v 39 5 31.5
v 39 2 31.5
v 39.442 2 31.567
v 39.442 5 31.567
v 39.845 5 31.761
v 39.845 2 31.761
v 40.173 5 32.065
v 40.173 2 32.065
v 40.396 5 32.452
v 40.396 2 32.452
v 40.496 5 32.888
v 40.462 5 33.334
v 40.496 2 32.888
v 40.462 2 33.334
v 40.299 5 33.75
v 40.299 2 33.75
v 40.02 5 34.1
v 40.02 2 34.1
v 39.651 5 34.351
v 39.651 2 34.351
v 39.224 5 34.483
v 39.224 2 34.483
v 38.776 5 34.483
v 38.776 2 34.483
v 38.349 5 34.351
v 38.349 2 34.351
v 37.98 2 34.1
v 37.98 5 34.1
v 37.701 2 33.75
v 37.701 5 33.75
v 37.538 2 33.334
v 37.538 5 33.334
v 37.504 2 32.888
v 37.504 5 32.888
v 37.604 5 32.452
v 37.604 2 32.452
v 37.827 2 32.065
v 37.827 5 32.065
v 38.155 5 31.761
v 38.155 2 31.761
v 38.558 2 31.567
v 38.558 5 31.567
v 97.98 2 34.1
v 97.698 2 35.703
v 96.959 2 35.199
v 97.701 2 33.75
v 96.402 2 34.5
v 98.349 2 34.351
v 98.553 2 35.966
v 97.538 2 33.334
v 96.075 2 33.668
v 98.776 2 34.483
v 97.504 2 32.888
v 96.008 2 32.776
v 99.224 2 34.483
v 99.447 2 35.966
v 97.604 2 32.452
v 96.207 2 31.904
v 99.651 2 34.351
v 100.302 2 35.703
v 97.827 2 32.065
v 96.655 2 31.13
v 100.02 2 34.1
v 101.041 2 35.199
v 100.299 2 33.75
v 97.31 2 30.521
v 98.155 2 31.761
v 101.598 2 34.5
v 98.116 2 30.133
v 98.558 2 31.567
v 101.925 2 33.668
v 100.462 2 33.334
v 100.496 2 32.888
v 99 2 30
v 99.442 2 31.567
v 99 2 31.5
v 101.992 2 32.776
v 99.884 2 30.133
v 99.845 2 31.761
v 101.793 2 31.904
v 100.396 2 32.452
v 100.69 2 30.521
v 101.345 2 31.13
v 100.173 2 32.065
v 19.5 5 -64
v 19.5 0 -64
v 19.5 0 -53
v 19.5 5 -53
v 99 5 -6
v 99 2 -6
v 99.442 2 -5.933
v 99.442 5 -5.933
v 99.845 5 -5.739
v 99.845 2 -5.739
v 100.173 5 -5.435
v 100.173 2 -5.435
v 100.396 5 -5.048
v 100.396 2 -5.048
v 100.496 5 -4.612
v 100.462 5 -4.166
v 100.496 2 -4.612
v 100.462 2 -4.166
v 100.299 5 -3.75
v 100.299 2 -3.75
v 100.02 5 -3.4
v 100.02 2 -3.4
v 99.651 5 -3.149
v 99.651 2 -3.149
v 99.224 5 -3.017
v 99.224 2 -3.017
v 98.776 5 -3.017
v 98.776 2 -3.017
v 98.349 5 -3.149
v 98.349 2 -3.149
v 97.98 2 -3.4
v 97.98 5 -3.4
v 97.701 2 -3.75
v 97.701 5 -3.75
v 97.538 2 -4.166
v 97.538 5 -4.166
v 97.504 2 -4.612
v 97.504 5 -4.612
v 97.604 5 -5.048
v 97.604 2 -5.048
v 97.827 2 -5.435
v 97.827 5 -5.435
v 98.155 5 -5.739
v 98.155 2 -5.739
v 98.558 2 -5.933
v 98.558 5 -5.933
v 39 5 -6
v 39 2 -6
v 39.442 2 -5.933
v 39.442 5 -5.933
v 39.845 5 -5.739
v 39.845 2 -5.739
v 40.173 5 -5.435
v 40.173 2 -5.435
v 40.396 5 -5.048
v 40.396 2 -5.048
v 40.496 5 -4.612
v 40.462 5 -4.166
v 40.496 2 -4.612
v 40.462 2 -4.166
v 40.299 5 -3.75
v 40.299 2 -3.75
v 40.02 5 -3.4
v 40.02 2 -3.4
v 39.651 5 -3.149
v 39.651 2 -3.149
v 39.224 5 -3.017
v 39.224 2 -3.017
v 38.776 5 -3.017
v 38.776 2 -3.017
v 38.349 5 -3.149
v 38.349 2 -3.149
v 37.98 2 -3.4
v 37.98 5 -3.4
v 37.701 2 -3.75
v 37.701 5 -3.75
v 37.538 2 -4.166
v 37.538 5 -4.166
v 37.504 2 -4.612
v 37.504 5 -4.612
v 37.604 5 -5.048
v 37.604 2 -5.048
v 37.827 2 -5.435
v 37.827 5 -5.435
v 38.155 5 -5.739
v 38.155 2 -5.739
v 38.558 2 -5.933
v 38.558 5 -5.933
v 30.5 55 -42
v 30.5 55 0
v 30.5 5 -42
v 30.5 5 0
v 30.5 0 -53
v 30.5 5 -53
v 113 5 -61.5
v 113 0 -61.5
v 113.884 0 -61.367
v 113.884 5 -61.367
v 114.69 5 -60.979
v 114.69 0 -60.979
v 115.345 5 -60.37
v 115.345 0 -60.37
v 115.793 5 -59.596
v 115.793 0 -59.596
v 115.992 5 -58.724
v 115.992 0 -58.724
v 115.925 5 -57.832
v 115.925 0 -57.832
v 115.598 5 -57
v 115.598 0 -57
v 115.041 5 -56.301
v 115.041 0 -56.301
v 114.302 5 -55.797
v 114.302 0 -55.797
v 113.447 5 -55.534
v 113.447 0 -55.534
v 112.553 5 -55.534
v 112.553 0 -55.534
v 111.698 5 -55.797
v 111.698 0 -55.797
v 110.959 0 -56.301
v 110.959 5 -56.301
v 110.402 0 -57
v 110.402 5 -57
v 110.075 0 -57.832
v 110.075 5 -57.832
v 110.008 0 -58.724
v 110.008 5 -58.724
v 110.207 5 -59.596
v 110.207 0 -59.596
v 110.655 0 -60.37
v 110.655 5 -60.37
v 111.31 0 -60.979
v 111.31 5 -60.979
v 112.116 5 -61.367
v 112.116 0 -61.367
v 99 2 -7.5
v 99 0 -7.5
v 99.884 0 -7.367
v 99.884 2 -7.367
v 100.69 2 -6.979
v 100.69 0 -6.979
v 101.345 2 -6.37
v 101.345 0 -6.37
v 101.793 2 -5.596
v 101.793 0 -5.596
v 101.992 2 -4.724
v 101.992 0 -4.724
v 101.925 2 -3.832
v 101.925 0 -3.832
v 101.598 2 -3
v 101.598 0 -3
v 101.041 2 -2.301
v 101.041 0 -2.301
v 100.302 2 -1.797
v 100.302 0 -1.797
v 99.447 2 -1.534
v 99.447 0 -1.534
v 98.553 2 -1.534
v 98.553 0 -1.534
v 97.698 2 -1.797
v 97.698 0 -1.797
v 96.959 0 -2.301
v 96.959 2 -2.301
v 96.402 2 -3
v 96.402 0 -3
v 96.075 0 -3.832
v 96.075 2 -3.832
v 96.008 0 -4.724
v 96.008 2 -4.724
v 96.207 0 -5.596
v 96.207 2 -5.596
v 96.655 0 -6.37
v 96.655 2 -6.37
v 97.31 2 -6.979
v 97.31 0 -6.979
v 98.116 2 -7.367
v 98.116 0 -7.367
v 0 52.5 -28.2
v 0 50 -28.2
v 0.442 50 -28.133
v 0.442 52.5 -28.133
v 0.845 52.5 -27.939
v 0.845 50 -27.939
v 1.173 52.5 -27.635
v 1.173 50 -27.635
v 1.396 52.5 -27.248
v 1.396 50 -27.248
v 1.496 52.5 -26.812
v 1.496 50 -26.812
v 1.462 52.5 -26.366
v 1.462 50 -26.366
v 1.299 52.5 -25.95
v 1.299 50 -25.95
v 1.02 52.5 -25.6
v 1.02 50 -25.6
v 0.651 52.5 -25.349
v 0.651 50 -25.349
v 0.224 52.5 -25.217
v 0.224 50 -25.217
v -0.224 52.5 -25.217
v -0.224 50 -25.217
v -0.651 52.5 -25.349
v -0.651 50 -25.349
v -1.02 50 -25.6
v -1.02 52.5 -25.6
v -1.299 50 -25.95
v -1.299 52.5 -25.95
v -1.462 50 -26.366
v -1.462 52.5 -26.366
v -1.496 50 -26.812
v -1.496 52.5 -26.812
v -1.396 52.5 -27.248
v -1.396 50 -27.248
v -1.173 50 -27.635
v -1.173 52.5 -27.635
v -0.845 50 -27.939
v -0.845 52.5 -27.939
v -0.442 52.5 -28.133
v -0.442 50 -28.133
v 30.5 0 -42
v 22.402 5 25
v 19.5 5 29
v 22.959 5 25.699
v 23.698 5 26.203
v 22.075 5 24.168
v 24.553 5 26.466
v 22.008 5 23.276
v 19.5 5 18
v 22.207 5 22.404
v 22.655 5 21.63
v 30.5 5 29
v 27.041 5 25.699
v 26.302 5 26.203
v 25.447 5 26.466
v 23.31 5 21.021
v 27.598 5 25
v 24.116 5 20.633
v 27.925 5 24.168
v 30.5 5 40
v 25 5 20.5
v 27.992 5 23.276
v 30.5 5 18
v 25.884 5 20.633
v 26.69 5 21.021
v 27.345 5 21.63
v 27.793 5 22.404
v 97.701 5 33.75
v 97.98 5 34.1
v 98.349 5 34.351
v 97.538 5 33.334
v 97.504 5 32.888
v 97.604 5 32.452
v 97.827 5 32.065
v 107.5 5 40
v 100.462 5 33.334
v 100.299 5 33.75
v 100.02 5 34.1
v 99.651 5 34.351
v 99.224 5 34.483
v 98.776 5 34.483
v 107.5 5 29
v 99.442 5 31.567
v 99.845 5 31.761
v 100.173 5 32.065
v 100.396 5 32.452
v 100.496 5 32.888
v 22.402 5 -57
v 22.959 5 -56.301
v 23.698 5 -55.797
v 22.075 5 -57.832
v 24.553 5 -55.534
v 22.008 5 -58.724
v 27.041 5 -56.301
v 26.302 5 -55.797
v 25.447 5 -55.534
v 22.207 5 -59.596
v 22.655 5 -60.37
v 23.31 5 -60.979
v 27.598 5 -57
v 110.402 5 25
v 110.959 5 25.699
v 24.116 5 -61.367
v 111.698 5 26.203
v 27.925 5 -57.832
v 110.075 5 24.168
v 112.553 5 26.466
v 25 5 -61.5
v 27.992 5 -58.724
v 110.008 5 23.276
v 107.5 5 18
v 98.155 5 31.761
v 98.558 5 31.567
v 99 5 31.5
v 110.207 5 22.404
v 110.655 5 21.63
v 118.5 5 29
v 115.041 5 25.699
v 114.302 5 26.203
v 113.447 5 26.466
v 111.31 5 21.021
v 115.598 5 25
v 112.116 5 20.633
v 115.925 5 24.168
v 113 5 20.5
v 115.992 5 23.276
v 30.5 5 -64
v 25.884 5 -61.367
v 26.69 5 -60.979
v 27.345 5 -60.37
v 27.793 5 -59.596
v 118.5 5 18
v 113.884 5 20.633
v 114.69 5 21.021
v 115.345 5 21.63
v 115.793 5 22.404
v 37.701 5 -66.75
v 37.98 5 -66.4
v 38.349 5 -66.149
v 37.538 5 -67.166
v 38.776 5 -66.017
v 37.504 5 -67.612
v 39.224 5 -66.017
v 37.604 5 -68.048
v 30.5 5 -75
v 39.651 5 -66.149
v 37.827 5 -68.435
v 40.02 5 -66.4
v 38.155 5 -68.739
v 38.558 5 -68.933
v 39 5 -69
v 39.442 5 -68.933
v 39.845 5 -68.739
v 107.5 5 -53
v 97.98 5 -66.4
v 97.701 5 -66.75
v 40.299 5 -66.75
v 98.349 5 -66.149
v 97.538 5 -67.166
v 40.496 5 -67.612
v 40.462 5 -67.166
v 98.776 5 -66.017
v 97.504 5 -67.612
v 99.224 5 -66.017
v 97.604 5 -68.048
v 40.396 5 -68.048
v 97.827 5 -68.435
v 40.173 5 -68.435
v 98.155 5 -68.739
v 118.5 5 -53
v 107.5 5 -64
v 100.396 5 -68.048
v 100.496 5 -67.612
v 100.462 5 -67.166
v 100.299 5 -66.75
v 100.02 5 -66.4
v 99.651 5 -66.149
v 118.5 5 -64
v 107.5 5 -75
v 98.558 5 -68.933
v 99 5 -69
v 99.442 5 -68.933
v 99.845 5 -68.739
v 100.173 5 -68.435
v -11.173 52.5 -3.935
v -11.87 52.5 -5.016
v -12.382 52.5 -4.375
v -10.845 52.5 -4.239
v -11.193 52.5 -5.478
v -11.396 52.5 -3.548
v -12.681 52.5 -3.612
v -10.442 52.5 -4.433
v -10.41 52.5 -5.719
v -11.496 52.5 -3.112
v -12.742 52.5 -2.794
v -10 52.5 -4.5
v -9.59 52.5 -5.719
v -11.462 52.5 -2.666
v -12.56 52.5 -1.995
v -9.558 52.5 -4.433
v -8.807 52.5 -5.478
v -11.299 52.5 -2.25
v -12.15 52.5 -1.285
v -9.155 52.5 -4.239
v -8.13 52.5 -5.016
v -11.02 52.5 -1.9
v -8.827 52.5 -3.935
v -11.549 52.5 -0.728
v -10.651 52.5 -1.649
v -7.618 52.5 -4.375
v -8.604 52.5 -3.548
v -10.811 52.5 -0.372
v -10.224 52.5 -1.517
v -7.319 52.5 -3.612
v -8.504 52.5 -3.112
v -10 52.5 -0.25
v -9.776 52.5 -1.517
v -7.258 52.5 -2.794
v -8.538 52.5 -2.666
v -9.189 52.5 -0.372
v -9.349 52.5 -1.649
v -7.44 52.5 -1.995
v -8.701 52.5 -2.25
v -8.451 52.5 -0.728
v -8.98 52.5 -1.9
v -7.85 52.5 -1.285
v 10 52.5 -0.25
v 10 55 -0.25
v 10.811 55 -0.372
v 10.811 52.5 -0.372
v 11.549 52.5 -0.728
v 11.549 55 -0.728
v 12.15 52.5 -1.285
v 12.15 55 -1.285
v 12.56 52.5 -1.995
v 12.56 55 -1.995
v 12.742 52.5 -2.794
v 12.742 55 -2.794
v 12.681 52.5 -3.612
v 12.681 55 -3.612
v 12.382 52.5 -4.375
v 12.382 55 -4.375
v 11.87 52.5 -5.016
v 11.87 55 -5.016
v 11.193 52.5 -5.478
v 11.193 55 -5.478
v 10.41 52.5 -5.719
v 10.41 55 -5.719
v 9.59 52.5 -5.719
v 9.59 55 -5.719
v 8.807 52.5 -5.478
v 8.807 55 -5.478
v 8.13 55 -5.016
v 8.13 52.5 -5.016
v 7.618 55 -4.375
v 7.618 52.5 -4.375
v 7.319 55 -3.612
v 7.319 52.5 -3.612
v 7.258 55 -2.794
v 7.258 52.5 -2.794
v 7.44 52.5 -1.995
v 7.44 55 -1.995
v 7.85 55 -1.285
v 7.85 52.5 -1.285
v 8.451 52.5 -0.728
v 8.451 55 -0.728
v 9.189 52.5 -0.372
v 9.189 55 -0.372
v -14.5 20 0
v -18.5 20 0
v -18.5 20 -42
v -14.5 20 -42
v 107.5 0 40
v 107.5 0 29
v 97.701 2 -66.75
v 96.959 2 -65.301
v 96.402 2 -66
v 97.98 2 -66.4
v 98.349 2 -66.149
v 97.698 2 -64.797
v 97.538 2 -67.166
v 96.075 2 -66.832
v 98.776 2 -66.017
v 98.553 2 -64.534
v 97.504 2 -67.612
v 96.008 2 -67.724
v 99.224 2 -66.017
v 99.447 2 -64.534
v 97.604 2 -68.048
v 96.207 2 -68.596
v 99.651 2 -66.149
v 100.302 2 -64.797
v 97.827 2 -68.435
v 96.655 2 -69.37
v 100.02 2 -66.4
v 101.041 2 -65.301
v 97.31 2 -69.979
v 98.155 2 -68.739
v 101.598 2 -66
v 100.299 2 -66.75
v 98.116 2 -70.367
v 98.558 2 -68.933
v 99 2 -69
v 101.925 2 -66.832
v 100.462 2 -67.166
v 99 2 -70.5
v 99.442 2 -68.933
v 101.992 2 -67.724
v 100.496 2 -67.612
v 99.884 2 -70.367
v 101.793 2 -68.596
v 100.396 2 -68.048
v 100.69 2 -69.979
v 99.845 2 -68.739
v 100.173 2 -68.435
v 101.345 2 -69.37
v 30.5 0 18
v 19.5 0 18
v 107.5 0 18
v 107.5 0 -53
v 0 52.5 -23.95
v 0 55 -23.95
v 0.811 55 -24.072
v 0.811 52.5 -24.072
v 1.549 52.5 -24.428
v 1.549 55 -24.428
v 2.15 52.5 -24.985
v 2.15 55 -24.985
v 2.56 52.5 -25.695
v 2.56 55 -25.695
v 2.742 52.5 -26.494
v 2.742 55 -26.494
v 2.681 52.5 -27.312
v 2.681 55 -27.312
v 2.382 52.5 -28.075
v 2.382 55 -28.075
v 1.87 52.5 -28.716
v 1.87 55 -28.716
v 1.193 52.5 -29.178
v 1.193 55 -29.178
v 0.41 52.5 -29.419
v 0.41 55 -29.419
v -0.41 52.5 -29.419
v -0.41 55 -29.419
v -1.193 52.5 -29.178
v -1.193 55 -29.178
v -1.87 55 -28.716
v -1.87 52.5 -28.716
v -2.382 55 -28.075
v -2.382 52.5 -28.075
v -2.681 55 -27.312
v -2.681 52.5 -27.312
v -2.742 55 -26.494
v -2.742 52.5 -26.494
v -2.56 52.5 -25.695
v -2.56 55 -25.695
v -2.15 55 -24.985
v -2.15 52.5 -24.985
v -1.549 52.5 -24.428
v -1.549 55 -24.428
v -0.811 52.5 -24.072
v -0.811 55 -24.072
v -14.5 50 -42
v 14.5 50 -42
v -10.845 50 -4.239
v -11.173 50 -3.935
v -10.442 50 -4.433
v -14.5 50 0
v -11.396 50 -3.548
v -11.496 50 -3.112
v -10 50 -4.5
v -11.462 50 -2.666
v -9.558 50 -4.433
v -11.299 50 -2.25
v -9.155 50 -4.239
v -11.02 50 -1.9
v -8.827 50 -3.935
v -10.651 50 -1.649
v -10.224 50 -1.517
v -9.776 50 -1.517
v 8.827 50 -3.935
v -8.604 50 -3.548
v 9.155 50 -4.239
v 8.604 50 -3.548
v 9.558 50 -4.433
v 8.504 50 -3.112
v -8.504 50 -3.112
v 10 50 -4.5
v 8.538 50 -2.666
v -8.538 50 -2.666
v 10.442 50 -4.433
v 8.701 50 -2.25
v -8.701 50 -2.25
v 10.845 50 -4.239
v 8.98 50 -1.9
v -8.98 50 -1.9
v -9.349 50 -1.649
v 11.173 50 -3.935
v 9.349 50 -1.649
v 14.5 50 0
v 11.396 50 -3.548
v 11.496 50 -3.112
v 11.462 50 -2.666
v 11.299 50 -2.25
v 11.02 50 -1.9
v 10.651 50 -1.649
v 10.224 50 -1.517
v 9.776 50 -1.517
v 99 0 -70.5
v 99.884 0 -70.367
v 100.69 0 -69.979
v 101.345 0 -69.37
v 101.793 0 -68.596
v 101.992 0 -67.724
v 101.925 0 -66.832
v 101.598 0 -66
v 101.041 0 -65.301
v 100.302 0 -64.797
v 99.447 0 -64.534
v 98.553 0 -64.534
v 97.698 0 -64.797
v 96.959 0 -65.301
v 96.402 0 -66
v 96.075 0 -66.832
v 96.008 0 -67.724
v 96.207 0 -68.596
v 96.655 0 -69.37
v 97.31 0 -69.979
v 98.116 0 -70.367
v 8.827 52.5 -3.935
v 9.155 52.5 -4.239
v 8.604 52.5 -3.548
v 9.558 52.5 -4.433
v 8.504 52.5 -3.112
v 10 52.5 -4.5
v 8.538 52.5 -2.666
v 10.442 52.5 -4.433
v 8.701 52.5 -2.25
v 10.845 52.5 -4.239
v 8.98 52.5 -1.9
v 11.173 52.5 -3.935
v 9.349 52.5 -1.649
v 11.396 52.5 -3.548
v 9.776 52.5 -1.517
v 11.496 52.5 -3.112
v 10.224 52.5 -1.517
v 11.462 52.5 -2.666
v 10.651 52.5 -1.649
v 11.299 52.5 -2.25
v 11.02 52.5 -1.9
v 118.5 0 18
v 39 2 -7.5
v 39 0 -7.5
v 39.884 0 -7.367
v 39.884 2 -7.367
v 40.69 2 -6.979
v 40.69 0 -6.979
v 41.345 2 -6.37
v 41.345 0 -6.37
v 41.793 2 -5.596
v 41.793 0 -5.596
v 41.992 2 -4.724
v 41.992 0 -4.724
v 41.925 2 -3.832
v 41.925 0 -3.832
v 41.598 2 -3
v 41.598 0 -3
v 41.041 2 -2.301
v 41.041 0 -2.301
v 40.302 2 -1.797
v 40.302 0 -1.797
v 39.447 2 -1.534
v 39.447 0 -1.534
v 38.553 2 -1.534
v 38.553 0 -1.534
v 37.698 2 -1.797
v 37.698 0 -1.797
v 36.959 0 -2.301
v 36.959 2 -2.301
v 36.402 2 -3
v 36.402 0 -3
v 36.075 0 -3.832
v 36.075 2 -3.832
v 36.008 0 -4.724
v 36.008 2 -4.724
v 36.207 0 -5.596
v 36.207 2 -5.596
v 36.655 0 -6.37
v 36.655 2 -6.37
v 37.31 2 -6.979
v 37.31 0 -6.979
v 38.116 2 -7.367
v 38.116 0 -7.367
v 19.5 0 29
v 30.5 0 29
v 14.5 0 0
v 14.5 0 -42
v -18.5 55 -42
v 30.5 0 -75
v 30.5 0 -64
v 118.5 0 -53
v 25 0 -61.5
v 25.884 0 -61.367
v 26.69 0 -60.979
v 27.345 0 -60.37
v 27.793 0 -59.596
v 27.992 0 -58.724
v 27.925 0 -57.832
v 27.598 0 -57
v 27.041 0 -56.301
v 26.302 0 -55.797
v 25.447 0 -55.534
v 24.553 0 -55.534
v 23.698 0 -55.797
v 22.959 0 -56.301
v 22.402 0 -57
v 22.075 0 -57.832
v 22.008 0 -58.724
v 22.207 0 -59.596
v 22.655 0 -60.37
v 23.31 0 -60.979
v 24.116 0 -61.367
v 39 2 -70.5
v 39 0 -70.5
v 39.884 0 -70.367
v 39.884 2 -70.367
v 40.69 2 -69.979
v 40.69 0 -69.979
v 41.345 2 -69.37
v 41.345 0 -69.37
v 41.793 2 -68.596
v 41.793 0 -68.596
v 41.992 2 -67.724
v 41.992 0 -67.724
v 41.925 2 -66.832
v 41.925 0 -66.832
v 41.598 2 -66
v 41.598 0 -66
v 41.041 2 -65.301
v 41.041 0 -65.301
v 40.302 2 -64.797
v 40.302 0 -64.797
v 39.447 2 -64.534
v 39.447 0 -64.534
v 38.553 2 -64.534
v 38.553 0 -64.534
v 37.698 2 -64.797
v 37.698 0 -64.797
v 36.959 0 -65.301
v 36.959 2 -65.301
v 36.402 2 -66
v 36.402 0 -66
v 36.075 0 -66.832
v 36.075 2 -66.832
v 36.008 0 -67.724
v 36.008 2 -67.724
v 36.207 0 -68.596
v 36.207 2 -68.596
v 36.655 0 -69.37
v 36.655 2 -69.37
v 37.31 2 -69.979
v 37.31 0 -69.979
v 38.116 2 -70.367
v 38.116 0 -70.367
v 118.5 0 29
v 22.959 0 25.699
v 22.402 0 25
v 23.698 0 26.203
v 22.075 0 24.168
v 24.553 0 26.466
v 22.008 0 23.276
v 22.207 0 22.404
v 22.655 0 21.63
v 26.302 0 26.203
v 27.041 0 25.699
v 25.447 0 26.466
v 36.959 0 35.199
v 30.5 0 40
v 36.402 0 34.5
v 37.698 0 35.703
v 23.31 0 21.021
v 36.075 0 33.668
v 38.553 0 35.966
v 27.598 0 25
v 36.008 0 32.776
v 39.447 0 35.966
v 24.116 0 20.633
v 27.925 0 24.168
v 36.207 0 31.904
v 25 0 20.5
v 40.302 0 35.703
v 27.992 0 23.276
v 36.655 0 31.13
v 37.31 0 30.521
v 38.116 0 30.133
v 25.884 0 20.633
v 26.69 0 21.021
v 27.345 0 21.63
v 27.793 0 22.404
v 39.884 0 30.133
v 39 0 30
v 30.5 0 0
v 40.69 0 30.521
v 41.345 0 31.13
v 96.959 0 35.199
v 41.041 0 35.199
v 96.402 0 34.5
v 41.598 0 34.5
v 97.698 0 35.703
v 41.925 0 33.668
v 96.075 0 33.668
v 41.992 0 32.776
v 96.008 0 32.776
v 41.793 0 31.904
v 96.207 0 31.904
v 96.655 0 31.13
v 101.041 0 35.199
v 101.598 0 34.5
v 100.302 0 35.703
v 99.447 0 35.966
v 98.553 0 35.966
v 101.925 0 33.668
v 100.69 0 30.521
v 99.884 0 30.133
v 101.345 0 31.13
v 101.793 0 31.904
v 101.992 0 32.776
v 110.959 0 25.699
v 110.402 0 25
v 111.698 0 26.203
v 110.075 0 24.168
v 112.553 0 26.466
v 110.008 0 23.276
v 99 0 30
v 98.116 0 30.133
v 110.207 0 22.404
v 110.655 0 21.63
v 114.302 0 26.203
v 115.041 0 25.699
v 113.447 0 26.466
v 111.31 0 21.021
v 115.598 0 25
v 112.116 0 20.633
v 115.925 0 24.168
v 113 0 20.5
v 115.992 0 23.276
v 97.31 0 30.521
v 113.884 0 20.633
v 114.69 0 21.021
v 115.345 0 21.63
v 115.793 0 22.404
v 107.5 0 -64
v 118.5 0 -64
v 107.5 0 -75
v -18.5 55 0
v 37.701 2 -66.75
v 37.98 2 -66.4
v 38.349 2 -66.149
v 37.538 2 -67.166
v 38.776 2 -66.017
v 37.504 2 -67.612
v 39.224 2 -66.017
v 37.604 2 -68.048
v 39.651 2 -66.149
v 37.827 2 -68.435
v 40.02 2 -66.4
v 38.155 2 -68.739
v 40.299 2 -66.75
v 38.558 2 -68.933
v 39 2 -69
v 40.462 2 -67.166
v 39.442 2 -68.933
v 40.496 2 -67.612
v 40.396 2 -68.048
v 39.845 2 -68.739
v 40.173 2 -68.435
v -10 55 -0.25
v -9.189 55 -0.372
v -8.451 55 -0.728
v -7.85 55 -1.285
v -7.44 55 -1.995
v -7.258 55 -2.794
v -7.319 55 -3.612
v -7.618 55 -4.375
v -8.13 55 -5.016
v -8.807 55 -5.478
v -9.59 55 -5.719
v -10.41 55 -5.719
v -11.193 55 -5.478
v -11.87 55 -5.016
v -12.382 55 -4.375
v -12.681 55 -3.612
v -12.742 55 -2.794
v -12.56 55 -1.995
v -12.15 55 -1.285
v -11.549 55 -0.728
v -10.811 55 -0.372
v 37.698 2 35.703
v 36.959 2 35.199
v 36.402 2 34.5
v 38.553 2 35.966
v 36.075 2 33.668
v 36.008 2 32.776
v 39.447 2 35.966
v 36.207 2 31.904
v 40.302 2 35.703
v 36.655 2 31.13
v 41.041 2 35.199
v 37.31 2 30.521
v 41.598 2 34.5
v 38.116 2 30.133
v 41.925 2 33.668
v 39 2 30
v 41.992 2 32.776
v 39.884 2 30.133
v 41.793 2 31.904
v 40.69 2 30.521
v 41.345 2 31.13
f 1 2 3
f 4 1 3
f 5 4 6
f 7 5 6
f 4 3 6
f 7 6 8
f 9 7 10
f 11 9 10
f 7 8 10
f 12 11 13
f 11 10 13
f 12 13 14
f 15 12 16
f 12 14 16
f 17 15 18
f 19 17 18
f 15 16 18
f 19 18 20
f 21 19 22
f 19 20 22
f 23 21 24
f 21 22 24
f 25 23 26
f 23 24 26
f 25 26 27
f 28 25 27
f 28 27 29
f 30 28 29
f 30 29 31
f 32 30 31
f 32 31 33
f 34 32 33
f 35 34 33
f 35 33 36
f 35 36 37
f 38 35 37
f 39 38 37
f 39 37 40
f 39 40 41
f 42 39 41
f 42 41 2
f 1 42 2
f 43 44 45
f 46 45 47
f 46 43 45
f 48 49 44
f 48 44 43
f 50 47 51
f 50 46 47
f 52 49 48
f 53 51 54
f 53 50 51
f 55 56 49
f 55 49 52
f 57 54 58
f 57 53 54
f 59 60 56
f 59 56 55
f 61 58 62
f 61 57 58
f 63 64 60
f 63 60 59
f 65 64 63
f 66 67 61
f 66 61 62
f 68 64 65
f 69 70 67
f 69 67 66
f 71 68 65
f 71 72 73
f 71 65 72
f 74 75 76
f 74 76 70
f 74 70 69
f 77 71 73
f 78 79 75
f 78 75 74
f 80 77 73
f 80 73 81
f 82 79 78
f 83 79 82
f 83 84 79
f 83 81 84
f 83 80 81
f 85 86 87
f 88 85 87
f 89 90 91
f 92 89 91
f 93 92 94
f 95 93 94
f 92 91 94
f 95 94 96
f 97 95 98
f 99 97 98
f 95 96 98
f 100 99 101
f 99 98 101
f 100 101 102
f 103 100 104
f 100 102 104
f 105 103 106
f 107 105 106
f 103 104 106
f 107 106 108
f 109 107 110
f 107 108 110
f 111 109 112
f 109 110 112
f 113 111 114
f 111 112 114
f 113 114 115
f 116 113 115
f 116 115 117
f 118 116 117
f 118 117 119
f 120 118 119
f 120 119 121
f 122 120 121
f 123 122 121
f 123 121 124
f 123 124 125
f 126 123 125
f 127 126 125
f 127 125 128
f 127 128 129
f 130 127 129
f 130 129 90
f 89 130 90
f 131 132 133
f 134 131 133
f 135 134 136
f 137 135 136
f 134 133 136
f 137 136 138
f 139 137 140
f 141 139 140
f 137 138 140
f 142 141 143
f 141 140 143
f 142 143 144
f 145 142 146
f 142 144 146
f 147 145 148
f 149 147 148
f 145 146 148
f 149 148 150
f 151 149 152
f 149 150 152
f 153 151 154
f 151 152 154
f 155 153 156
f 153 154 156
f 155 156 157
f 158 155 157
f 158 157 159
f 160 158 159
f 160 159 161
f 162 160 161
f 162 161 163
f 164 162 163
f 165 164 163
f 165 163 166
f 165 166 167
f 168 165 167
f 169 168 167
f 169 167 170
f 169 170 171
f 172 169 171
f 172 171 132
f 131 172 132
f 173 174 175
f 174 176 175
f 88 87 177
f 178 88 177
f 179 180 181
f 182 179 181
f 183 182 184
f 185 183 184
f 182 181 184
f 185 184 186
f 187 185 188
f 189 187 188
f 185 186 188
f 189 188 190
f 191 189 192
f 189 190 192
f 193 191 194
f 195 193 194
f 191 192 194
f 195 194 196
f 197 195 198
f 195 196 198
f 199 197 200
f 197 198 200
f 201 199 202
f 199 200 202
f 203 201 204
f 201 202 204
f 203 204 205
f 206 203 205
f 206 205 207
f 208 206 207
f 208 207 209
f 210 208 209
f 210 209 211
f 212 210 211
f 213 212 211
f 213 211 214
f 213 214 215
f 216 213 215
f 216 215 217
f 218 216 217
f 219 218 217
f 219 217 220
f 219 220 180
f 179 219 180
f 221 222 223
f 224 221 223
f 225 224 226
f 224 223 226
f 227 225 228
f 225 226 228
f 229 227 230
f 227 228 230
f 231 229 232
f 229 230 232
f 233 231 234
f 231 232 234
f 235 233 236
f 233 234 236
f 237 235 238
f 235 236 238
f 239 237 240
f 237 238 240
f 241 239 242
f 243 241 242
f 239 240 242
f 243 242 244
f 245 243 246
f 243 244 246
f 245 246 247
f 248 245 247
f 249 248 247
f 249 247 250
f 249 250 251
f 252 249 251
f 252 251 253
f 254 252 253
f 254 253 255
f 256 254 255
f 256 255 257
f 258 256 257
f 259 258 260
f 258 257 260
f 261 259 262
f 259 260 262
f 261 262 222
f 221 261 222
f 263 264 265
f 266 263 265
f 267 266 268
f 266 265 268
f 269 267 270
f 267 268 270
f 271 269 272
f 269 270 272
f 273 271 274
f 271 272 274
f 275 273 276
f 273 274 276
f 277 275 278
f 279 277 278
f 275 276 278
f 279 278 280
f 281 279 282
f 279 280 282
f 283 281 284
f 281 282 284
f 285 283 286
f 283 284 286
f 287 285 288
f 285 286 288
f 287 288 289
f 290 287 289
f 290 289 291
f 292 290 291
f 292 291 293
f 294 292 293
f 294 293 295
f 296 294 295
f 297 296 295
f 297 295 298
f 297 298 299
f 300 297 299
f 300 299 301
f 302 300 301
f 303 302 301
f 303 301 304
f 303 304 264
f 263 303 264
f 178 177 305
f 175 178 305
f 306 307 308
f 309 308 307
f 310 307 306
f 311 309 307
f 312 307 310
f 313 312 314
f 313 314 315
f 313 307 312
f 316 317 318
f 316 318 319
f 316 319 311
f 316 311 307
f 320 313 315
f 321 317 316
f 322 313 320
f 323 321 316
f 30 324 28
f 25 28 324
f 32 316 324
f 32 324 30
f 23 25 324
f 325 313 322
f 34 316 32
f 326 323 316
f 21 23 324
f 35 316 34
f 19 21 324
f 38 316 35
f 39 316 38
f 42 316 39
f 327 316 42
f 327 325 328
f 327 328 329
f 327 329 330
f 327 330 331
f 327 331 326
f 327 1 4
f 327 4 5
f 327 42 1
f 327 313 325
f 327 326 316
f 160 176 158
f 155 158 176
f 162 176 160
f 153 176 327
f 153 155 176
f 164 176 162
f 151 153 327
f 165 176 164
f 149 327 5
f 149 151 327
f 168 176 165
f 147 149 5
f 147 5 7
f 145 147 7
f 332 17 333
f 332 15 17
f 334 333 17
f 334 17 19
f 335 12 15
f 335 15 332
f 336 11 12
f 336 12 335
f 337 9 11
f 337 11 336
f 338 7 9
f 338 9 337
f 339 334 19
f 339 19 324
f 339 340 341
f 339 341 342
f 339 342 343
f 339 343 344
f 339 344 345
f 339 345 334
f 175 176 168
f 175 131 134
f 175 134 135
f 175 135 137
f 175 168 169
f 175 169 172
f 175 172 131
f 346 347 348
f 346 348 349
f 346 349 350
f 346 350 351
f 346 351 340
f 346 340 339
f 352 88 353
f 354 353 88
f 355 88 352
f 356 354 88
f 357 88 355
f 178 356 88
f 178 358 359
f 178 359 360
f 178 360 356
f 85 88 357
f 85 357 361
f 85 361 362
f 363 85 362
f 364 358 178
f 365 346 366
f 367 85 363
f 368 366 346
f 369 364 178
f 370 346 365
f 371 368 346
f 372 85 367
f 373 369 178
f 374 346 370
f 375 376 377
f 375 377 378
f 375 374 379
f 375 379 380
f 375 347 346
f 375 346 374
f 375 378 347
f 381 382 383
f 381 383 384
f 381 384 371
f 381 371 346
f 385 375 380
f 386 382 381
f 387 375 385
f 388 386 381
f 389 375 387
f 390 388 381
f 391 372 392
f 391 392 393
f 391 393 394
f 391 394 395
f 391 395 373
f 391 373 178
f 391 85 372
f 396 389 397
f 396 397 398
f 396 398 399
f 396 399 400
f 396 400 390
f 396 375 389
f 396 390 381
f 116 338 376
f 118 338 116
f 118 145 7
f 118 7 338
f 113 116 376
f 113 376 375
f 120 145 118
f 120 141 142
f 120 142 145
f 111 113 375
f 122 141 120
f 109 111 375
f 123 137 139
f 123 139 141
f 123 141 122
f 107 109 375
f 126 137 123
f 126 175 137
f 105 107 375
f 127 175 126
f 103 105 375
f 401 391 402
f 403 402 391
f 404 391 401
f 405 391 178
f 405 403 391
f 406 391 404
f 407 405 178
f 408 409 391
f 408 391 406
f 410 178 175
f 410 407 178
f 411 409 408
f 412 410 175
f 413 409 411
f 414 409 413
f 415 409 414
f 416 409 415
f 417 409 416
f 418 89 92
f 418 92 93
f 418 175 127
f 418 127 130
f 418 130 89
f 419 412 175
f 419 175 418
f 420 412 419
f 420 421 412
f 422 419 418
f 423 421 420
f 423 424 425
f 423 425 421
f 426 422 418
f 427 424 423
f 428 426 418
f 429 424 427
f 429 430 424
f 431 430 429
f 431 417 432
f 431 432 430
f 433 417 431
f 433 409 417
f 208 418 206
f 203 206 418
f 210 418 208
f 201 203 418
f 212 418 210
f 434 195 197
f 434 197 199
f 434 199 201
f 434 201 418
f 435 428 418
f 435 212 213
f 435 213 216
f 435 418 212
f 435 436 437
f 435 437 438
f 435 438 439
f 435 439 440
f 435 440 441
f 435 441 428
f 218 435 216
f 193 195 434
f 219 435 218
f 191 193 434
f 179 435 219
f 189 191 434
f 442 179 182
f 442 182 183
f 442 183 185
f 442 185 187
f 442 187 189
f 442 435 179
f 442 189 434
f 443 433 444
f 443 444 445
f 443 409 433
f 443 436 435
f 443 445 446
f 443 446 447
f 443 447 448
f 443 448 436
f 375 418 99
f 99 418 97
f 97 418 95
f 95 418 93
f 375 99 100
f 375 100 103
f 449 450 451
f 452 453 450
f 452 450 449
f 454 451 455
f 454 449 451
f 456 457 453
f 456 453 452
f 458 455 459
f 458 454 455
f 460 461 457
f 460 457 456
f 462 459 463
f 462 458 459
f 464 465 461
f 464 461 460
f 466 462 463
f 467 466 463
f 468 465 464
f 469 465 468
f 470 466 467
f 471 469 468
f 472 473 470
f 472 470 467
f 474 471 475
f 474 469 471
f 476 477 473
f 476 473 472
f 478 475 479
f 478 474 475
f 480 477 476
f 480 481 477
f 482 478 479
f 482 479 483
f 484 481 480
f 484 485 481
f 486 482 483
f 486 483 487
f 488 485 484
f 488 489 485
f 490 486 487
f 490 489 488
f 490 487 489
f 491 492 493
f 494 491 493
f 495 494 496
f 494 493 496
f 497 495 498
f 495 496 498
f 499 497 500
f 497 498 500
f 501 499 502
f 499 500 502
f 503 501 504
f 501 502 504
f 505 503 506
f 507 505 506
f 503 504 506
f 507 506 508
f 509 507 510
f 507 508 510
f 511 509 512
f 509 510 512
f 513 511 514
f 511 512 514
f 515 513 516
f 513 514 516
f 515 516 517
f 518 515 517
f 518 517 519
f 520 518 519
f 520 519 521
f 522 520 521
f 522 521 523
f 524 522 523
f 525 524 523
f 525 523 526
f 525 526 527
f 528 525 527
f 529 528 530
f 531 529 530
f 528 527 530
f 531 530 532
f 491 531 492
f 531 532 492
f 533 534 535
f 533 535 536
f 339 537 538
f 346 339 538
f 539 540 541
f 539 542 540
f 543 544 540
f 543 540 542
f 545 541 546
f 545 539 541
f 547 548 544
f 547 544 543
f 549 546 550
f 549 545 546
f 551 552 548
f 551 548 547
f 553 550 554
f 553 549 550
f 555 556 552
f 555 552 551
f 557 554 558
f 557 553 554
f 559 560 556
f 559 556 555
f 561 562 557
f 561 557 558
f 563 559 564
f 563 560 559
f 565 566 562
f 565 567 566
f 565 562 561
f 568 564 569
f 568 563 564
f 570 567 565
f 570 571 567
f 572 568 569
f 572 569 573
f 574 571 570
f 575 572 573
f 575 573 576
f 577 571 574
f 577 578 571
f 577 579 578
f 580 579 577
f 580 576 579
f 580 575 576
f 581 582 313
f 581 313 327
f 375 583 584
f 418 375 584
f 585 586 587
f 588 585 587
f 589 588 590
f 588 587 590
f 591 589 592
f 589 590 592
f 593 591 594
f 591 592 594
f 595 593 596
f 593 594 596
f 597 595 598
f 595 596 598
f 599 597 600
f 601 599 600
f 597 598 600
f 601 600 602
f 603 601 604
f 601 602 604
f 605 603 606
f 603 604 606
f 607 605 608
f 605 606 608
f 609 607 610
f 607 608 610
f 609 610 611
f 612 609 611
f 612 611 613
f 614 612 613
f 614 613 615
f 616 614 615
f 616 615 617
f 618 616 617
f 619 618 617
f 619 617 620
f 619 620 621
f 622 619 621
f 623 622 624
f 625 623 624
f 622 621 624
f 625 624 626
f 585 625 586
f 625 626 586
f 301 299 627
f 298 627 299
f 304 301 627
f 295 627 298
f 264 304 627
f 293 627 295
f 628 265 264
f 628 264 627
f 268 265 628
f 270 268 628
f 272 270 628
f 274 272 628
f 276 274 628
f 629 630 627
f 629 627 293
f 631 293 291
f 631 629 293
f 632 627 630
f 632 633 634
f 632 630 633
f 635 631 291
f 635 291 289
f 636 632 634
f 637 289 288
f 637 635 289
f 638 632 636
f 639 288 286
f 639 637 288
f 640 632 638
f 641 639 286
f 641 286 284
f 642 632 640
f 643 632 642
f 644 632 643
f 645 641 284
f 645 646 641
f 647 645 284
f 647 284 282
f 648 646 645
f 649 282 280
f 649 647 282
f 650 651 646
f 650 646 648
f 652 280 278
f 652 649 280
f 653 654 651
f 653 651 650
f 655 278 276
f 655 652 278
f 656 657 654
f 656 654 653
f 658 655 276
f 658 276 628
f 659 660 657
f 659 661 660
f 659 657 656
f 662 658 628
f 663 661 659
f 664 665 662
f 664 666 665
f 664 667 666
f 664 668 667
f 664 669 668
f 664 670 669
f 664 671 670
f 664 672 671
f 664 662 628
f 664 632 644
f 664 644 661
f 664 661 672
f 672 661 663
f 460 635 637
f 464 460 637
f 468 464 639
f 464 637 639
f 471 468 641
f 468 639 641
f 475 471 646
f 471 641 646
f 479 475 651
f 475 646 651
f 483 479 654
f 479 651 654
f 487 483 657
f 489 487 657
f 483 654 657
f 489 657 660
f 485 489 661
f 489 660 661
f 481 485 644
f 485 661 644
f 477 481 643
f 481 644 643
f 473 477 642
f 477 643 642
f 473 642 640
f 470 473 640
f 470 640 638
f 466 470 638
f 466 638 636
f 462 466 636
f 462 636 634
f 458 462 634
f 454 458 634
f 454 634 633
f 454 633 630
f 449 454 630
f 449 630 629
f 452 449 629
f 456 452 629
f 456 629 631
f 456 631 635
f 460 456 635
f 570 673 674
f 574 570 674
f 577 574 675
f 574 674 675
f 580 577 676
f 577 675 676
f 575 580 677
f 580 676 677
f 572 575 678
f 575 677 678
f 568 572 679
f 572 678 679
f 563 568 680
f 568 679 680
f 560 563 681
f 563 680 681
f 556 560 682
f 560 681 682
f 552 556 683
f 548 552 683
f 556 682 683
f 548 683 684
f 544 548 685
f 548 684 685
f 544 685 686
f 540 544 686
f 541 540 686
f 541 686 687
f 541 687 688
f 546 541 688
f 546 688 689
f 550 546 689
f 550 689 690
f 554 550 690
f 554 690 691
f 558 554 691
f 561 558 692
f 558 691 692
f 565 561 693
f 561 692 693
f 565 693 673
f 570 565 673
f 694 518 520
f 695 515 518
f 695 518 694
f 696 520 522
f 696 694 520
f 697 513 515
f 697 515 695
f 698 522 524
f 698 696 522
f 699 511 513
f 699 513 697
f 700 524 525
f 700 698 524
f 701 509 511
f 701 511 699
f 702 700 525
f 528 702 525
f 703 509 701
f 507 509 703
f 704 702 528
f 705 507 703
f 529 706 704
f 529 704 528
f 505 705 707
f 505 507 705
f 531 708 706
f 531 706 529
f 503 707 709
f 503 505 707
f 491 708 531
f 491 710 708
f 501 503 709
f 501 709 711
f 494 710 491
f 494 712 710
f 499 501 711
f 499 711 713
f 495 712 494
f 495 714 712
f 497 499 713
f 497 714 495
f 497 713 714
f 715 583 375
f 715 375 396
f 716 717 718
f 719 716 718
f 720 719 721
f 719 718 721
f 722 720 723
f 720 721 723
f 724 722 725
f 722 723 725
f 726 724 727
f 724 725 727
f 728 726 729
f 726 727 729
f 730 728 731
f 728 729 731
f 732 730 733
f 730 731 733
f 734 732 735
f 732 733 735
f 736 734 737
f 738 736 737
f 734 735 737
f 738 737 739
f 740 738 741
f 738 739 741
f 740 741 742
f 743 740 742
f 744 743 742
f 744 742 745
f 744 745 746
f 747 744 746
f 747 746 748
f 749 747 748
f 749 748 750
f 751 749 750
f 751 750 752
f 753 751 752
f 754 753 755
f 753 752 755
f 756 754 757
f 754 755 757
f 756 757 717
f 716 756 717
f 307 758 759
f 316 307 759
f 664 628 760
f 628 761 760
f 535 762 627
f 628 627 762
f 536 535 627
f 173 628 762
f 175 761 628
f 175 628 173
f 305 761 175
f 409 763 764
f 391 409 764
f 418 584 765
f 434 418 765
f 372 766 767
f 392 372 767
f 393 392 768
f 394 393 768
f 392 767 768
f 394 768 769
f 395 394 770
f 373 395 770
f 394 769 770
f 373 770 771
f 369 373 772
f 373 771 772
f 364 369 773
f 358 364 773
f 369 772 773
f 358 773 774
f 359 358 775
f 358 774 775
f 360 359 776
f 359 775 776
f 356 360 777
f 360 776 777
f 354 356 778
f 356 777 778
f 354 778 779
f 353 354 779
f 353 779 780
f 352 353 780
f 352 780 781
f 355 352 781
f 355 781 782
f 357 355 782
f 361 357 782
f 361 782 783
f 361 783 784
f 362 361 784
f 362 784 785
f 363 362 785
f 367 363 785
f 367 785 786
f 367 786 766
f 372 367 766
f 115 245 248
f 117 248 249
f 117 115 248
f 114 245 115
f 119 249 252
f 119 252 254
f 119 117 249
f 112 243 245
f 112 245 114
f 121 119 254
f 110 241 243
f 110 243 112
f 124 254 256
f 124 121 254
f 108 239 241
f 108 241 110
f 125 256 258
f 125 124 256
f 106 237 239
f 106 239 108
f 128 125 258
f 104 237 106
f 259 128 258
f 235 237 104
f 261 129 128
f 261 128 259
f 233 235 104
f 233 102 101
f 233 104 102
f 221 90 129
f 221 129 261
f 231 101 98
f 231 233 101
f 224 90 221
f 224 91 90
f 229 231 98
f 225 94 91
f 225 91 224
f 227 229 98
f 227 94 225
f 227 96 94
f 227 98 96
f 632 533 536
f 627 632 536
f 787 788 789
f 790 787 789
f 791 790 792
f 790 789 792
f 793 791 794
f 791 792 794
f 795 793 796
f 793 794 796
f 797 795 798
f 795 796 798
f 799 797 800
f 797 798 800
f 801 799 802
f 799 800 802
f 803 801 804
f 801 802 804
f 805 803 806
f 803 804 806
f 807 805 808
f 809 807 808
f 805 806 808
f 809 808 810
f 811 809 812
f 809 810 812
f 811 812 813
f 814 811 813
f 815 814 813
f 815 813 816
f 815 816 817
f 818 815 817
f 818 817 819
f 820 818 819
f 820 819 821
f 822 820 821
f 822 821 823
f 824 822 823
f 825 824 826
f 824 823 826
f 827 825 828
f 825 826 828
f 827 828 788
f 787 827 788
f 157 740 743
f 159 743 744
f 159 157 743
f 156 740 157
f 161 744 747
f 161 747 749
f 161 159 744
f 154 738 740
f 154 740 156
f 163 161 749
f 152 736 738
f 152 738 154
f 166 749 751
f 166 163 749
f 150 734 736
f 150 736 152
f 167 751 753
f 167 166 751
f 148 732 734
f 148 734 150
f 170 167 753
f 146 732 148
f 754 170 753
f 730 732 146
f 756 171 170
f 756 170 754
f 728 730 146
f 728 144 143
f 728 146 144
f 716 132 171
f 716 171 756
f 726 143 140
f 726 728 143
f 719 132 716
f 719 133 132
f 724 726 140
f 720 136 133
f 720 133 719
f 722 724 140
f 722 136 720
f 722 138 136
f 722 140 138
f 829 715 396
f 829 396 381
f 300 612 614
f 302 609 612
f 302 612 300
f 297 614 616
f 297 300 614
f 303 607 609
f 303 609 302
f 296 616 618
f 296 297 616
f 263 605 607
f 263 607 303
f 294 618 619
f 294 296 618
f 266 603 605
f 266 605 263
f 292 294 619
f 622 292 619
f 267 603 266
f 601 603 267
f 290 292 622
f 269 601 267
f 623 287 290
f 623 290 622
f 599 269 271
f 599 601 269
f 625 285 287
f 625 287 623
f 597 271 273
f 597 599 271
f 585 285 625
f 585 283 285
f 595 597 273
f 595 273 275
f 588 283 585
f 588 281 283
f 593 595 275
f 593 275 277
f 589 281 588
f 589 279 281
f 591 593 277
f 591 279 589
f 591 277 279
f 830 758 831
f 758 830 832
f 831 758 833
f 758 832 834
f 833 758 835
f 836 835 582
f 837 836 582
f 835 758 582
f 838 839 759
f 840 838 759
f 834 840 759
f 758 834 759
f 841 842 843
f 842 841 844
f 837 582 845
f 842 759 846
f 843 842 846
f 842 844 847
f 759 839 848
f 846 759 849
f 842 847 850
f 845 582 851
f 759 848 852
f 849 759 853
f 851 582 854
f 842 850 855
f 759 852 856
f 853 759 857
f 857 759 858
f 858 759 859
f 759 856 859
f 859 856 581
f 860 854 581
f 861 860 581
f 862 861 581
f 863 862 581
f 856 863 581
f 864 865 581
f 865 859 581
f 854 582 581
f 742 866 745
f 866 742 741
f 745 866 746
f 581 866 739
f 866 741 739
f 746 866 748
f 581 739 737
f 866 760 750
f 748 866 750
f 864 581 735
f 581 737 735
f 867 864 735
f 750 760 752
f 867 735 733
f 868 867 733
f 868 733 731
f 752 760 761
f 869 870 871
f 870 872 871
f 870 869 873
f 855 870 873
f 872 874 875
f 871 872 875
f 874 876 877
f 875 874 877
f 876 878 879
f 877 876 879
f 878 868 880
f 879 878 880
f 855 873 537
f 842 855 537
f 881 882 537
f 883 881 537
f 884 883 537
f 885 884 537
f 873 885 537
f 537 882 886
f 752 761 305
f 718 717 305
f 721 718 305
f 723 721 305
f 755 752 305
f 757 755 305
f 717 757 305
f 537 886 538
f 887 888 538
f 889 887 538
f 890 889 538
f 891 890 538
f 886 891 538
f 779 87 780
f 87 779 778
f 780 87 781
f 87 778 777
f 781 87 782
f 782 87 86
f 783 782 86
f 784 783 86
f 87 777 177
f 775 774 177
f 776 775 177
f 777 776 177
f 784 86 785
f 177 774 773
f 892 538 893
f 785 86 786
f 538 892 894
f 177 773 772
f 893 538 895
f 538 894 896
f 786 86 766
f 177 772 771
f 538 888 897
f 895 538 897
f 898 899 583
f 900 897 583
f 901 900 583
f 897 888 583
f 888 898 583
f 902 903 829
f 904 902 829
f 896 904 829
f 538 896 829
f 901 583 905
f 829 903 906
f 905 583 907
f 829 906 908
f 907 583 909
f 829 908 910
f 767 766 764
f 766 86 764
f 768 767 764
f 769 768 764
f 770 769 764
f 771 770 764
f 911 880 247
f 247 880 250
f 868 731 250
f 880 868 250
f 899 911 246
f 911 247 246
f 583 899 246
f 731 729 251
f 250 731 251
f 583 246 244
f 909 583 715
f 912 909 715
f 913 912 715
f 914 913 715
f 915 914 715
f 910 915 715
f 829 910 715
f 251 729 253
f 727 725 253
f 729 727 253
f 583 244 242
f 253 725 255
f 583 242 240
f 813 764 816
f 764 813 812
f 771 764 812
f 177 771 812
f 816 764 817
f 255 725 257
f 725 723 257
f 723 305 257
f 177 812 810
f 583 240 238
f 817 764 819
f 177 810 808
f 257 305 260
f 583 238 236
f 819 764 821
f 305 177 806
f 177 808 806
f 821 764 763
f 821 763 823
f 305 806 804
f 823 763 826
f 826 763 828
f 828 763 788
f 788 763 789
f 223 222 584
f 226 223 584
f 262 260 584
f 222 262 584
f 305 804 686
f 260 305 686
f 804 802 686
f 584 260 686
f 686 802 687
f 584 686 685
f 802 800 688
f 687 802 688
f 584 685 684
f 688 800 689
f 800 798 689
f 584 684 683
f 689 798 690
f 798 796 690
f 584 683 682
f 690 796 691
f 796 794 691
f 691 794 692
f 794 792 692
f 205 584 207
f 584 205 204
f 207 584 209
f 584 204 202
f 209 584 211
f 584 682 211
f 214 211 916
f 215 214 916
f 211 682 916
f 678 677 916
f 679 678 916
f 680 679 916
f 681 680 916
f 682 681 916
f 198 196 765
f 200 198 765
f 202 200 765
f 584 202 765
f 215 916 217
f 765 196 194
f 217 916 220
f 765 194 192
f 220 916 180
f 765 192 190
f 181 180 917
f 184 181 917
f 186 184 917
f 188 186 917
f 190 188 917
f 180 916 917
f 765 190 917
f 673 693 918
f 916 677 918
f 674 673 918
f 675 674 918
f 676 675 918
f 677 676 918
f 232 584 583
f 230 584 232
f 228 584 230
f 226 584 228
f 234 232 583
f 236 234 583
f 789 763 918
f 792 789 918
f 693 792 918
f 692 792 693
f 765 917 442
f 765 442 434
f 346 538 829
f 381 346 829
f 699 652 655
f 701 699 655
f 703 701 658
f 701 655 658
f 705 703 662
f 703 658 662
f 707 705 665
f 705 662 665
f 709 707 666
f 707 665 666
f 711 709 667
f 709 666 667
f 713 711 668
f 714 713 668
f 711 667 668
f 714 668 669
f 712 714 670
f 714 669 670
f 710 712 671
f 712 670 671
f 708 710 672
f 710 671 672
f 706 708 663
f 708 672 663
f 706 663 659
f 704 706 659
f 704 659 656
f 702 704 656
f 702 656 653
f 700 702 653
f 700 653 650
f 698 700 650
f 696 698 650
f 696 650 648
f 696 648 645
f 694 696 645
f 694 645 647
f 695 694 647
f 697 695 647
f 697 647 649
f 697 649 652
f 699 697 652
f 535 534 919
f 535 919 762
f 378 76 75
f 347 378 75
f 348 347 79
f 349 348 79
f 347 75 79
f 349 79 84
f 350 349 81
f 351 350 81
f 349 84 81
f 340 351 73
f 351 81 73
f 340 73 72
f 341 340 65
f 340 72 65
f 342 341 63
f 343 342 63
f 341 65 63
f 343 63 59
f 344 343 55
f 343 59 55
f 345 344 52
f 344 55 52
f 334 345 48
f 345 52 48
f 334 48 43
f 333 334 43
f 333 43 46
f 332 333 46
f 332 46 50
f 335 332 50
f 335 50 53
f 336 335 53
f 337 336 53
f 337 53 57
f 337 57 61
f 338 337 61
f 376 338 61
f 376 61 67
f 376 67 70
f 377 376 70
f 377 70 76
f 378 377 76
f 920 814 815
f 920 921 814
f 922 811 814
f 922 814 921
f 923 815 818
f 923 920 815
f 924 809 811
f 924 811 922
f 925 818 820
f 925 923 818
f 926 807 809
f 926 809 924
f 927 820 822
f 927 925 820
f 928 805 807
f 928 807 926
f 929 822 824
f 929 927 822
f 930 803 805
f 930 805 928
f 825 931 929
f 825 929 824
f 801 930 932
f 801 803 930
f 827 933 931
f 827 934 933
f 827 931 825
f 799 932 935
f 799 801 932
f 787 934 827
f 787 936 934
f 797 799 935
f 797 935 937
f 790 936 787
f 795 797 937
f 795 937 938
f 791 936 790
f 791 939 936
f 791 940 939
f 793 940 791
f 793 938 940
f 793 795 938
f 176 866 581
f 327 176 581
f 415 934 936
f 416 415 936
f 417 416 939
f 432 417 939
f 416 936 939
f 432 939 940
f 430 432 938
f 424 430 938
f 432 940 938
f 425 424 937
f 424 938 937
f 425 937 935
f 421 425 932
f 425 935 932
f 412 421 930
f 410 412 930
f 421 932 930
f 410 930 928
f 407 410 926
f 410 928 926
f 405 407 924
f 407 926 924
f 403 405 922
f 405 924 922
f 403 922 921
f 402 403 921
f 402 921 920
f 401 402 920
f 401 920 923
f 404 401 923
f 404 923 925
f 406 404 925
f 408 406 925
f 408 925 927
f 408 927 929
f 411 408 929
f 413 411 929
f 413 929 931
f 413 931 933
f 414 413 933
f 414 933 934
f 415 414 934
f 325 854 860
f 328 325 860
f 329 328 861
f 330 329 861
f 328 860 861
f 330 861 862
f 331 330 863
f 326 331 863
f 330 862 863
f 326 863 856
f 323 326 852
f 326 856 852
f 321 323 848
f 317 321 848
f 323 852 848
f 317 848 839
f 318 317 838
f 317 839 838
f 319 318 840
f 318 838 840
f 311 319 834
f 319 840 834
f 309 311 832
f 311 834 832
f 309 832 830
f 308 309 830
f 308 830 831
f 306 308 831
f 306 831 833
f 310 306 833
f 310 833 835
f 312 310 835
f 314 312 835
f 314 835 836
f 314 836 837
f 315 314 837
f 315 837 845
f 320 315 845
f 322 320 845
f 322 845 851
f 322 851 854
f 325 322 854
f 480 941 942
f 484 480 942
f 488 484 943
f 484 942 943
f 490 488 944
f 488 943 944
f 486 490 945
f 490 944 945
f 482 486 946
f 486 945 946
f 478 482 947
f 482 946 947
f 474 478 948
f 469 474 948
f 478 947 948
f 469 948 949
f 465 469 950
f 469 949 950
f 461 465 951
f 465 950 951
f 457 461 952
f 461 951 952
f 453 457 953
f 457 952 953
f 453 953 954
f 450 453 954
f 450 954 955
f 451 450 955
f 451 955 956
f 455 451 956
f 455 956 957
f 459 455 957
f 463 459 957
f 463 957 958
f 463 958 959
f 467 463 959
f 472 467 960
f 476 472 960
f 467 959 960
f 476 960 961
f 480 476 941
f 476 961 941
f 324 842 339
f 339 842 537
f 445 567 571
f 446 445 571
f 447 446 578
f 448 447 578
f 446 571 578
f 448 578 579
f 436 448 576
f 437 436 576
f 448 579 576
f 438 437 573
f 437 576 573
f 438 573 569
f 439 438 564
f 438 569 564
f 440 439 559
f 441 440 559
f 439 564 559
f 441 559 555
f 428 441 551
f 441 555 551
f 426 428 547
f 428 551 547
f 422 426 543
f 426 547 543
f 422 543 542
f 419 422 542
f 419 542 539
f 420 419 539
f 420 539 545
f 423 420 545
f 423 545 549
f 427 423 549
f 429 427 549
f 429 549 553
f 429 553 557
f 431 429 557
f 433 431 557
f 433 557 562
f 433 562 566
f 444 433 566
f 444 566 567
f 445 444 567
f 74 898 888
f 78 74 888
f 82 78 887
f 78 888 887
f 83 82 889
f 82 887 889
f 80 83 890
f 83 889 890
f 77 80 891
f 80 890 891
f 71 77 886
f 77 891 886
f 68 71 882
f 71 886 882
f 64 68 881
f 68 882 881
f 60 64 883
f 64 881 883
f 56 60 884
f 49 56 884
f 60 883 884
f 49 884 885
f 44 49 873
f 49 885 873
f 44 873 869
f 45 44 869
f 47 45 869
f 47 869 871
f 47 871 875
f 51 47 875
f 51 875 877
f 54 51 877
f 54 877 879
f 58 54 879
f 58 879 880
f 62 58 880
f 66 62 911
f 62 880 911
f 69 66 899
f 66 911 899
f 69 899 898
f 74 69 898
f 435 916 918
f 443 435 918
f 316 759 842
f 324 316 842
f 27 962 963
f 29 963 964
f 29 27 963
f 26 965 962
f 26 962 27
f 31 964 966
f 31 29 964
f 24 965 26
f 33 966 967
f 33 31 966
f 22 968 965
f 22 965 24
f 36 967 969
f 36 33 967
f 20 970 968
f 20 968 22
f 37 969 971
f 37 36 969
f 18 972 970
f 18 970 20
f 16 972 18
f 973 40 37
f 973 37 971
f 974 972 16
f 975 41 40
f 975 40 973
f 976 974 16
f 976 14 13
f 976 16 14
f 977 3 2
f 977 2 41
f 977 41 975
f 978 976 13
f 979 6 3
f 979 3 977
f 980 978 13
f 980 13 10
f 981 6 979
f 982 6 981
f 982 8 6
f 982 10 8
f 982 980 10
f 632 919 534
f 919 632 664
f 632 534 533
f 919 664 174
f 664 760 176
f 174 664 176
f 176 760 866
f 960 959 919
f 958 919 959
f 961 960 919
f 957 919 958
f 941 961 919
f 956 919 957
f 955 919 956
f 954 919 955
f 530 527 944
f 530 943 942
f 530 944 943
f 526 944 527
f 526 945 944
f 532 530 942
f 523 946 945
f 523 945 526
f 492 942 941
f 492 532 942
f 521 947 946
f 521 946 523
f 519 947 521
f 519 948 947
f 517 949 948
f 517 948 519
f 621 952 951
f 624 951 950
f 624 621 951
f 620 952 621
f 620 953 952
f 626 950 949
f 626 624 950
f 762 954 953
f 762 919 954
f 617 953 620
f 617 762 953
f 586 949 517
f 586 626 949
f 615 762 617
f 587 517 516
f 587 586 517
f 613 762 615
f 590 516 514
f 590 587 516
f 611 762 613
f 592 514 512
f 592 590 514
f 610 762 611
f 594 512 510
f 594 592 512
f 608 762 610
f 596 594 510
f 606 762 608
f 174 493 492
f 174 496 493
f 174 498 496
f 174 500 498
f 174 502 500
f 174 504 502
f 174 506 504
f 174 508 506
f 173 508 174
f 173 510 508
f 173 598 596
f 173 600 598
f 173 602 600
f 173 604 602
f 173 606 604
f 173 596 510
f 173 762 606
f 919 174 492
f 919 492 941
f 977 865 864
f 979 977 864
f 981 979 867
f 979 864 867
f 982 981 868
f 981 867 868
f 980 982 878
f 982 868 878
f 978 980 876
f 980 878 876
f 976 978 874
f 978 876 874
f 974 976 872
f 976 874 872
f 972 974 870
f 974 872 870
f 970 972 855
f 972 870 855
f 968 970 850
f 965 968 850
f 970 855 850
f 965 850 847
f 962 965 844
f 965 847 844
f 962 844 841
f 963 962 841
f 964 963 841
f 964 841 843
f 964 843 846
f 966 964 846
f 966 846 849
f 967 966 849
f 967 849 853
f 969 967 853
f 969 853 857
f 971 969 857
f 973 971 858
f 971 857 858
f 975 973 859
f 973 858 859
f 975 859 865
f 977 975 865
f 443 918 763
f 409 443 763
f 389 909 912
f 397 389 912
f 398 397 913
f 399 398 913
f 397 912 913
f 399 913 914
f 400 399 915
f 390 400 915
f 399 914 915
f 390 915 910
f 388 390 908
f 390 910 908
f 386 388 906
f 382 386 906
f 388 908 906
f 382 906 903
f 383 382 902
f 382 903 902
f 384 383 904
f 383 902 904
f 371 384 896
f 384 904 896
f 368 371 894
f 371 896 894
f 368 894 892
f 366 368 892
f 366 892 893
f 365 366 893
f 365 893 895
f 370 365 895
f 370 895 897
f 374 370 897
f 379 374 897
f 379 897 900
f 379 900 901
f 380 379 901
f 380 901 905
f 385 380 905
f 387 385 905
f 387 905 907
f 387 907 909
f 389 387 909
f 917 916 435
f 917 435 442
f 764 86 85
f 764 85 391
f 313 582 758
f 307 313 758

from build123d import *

# Parameters (mm, degrees)
SKETCH_1_W               = 4
SKETCH_1_H               = 42
SKETCH_1_W_2             = 29
SKETCH_1_W_3             = 16
EXTRUDE_2_DEPTH          = 90
CUT_EXTRUDE_3_DEPTH      = 30
CUT_EXTRUDE_3_DEPTH_BACK = 1
SKETCH_1_6_W             = 29
SKETCH_1_6_H             = 42
SKETCH_7_W               = 77
SKETCH_7_H               = 115
CUT_EXTRUDE_5_DEPTH      = 85
SKETCH_8_W               = 49
SKETCH_8_H               = 42
CUT_EXTRUDE_6_DEPTH      = 55
SKETCH_11_R              = 1.5
CUT_EXTRUDE_9_DEPTH      = 6
SKETCH_14_R              = 3
CUT_EXTRUDE_11_DEPTH     = 2
SKETCH_18_W              = 49
SKETCH_18_H              = 42
EXTRUDE_3_DEPTH          = 20
SKETCH_19_W              = 29
SKETCH_19_H              = 42
CUT_EXTRUDE_14_DEPTH     = 20
SKETCH_20_R              = 1.5
CUT_EXTRUDE_15_DEPTH     = 141.289878466
SKETCH_21_R              = 2.75
CUT_EXTRUDE_16_DEPTH     = 2.5
SKETCH_25_W              = 4
SKETCH_25_H              = 42
CUT_EXTRUDE_18_DEPTH     = 20
SKETCH_26_W              = 11
SKETCH_26_H              = 11
EXTRUDE_4_DEPTH          = 5
SKETCH_28_R              = 3
CUT_EXTRUDE_19_DEPTH     = 151.639470259


with BuildPart() as part:
    # 草图1 → 凸台-拉伸2 (new body)
    with BuildSketch(Plane(origin=(0, 0, 0), x_dir=(1, 0, 0), z_dir=(0, 1, 0))):
        with Locations((-16.5, 21)):
            Rectangle(SKETCH_1_W, SKETCH_1_H)
        with Locations((0, 21)):
            Rectangle(SKETCH_1_W_2, SKETCH_1_H)
        with Locations((22.5, 21)):
            Rectangle(SKETCH_1_W_3, SKETCH_1_H)
        with Locations((32.5, 21)):
            Rectangle(SKETCH_1_W, SKETCH_1_H)
        Polygon((30.5, 75), (30.5, 42), (34.5, 42), (34.5, 0), (30.5, 0), (30.5, -40), (107.5, -40), (107.5, 75), align=None)
    extrude(amount=EXTRUDE_2_DEPTH)

    # 草图1<6> → 切除-拉伸3 (cut, two sides: drawn at the far end of the back side and taken through both)
    with BuildSketch(Plane(origin=(0, 0, 0), x_dir=(1, 0, 0), z_dir=(0, 1, 0)).offset(-CUT_EXTRUDE_3_DEPTH_BACK)):
        with Locations((0, 21)):
            Rectangle(SKETCH_1_6_W, SKETCH_1_6_H)
    extrude(amount=CUT_EXTRUDE_3_DEPTH + CUT_EXTRUDE_3_DEPTH_BACK, mode=Mode.SUBTRACT)

    # 草图7 → 切除-拉伸5 (cut)
    with BuildSketch(Plane(origin=(0, 90, 0), x_dir=(1, 0, 0), z_dir=(0, 1, 0))):
        with Locations((69, 17.5)):
            Rectangle(SKETCH_7_W, SKETCH_7_H)
    extrude(amount=-CUT_EXTRUDE_5_DEPTH, mode=Mode.SUBTRACT)

    # 草图8 → 切除-拉伸6 (cut)
    with BuildSketch(Plane(origin=(0, 90, 0), x_dir=(1, 0, 0), z_dir=(0, 1, 0))):
        with Locations((6, 21)):
            Rectangle(SKETCH_8_W, SKETCH_8_H)
    extrude(amount=-CUT_EXTRUDE_6_DEPTH, mode=Mode.SUBTRACT)

    # 草图11 → 切除-拉伸9 (cut)
    with BuildSketch(Plane.XZ):
        with Locations(Location((39, 33, 0), (0, 0, 270))):
            Circle(SKETCH_11_R)
        with Locations(Location((99, 33, 0), (0, 0, 270))):
            Circle(SKETCH_11_R)
        with Locations(Location((39, -4.5, 0), (0, 0, 270))):
            Circle(SKETCH_11_R)
        with Locations(Location((99, -4.5, 0), (0, 0, 270))):
            Circle(SKETCH_11_R)
        with Locations(Location((99, -67.5, 0), (0, 0, 270))):
            Circle(SKETCH_11_R)
        with Locations(Location((39, -67.5, 0), (0, 0, 270))):
            Circle(SKETCH_11_R)
    extrude(amount=-CUT_EXTRUDE_9_DEPTH, mode=Mode.SUBTRACT)

    # 草图14 → 切除-拉伸11 (cut)
    with BuildSketch(Plane.XZ):
        with Locations(Location((39, 33, 0), (0, 0, 270))):
            Circle(SKETCH_14_R)
        with Locations(Location((99, 33, 0), (0, 0, 270))):
            Circle(SKETCH_14_R)
        with Locations(Location((39, -4.5, 0), (0, 0, 270))):
            Circle(SKETCH_14_R)
        with Locations(Location((99, -4.5, 0), (0, 0, 270))):
            Circle(SKETCH_14_R)
        with Locations(Location((39, -67.5, 0), (0, 0, 270))):
            Circle(SKETCH_14_R)
        with Locations(Location((99, -67.5, 0), (0, 0, 270))):
            Circle(SKETCH_14_R)
    extrude(amount=-CUT_EXTRUDE_11_DEPTH, mode=Mode.SUBTRACT)

    # 草图18 → 凸台-拉伸3 (add)
    with BuildSketch(Plane(origin=(0, 35, 0), x_dir=(1, 0, 0), z_dir=(0, 1, 0))):
        with Locations((6, 21)):
            Rectangle(SKETCH_18_W, SKETCH_18_H)
    extrude(amount=EXTRUDE_3_DEPTH)

    # 草图19 → 切除-拉伸14 (cut)
    with BuildSketch(Plane.XZ.offset(-30)):
        with Locations((0, -21)):
            Rectangle(SKETCH_19_W, SKETCH_19_H)
    extrude(amount=-CUT_EXTRUDE_14_DEPTH, mode=Mode.SUBTRACT)

    # 草图20 → 切除-拉伸15 (cut, through all)
    with BuildSketch(Plane.XZ.offset(-50)):
        with Locations(Location((-10, -3, 0), (0, 0, 270))):
            Circle(SKETCH_20_R)
        with Locations(Location((10, -3, 0), (0, 0, 270))):
            Circle(SKETCH_20_R)
        with Locations(Location((0, -26.7, 0), (0, 0, 270))):
            Circle(SKETCH_20_R)
    extrude(amount=-CUT_EXTRUDE_15_DEPTH, mode=Mode.SUBTRACT)

    # 草图21 → 切除-拉伸16 (cut)
    with BuildSketch(Plane(origin=(0, 55, 0), x_dir=(1, 0, 0), z_dir=(0, 1, 0))):
        with Locations(Location((0, 26.7, 0), (0, 0, 270))):
            Circle(SKETCH_21_R)
        with Locations(Location((-10, 3, 0), (0, 0, 270))):
            Circle(SKETCH_21_R)
        with Locations(Location((10, 3, 0), (0, 0, 270))):
            Circle(SKETCH_21_R)
    extrude(amount=-CUT_EXTRUDE_16_DEPTH, mode=Mode.SUBTRACT)

    # 草图25 → 切除-拉伸18 (cut)
    with BuildSketch(Plane.XZ):
        with Locations((-16.5, -21)):
            Rectangle(SKETCH_25_W, SKETCH_25_H)
    extrude(amount=-CUT_EXTRUDE_18_DEPTH, mode=Mode.SUBTRACT)

    # 草图26 → 凸台-拉伸4 (add)
    with BuildSketch(Plane.XZ):
        with Locations((25, 23.5)):
            Rectangle(SKETCH_26_W, SKETCH_26_H)
        with Locations((113, 23.5)):
            Rectangle(SKETCH_26_W, SKETCH_26_H)
        with Locations((25, -58.5)):
            Rectangle(SKETCH_26_W, SKETCH_26_H)
        with Locations((113, -58.5)):
            Rectangle(SKETCH_26_W, SKETCH_26_H)
    extrude(amount=-EXTRUDE_4_DEPTH)

    # 草图28 → 切除-拉伸19 (cut, through all)
    with BuildSketch(Plane.XZ):
        with Locations(Location((25, 23.5, 0), (0, 0, 270))):
            Circle(SKETCH_28_R)
        with Locations(Location((113, 23.5, 0), (0, 0, 270))):
            Circle(SKETCH_28_R)
        with Locations(Location((25, -58.5, 0), (0, 0, 270))):
            Circle(SKETCH_28_R)
        with Locations(Location((113, -58.5, 0), (0, 0, 270))):
            Circle(SKETCH_28_R)
    extrude(amount=-CUT_EXTRUDE_19_DEPTH, mode=Mode.SUBTRACT)


solid = part.part
